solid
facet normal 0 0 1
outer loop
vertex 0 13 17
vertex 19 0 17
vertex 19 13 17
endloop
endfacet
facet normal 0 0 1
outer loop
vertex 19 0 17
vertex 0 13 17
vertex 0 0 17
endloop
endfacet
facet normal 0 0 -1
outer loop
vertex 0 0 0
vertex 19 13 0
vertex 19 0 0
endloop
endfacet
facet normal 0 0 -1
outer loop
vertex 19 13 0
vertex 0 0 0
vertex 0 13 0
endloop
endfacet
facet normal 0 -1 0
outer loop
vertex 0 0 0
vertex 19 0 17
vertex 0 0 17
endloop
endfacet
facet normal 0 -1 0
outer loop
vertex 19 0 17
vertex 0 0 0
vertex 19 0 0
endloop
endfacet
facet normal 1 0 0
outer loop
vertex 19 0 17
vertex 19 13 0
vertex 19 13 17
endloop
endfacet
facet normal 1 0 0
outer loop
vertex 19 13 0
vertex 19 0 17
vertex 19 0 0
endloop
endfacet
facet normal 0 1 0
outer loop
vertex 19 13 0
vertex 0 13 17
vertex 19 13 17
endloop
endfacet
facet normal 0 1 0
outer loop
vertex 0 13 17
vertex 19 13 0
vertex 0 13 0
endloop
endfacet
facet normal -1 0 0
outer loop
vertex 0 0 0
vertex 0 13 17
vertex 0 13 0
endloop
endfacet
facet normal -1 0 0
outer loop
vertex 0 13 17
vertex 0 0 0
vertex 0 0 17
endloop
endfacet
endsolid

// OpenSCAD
// Generated by SolidPython 1.0.1 on 2020-07-29 00:46:56


cube(size = [19, 13, 17]);
/***********************************************
*********      SolidPython code:      **********
************************************************
 
# import packages: SolidPython
from solid import *
from solid.utils import *
from itertools import chain, combinations, permutations


class Resize:

    def __init__(self, scad_file):
        self.scad_file = scad_file
        #self.scad_file = import_scad(scad_file)
        # cone/cylinder param:
        self.r1 = 0
        self.r2 = 0
        self.h = 0
        # rectangular prism param:
        self.w = 0
        self.l = 0
        # ellipse param:
        self.r = 0

    # import OpenScad code (file name corresponds to shape)


    # classify shape + parameters
    def assign(self, param1, param2, param3):
        if self.scad_file == 'cone.scad':
            self.r1 = param1
            self.r2 = param2
            self.h = param3
        elif self.scad_file == 'cylinder.scad':
            self.r1 = param1
            self.r2 = param2
            self.h = param3
        elif self.scad_file == 'rectangularPrism.scad':
            self.h = param1
            self.l = param2
            self.w = param3
        else:
            self.r = param1
            self.h = param2

    # resize parameters
    def iterate(self):
        x = range(3, 20, 2)
        i = 1
        if self.scad_file == 'cone.scad':
            tempList = list(permutations(x, 2))
            for temp in tempList:
                param1 = temp[0]
                param2 = temp[1]
                filepath = 'produced_scad_files/' + 'cone' + str(param1) + '_' + str(param2) + '_' + '.scad'
                scad_render_to_file(cylinder(h=param1, r1=param2, r2=0), filepath)

        elif self.scad_file == 'cylinder.scad':
            tempList = list(permutations(x, 3))
            for temp in tempList:
                param1 = temp[0]
                param2 = temp[1]
                filepath = 'produced_scad_files/' + 'cylinder' + str(param1) + '_' + str(param2) + '_' + '.scad'
                scad_render_to_file(cylinder(h=param1, r1=param2, r2=param2), filepath)

        elif self.scad_file == 'rectangularPrism.scad':
            tempList = list(permutations(x, 3))
            for temp in tempList:
                param1 = temp[0]
                param2 = temp[1]
                param3 = temp[2]
                filepath = 'produced_scad_files/' + 'rectangularPrism' + str(param1) + '_' + str(param2) + '_' + str(
                    param3) + '.scad'
                scad_render_to_file(cube(size=(param1, param2, param3)), filepath)

        elif self.scad_file == 'ellipse.scad':
            tempList = list(permutations(x, 4))
            for temp in tempList:
                param1 = temp[0]
                param2 = temp[1]
                param3 = temp[2]
                param4 = temp[3]
                filepath = 'produced_scad_files/' + 'ellipse' + str(param1) + '_' + str(param2) + '_' + str(param3) + '_' + str(param4) + '.scad'
                scad_render_to_file(scale([param1, param2, param3])(sphere(r=param4)), filepath)

    def render_to_scadfile(self):
        scad_render_to_file(scad, 'example.scad') 
 
************************************************/
